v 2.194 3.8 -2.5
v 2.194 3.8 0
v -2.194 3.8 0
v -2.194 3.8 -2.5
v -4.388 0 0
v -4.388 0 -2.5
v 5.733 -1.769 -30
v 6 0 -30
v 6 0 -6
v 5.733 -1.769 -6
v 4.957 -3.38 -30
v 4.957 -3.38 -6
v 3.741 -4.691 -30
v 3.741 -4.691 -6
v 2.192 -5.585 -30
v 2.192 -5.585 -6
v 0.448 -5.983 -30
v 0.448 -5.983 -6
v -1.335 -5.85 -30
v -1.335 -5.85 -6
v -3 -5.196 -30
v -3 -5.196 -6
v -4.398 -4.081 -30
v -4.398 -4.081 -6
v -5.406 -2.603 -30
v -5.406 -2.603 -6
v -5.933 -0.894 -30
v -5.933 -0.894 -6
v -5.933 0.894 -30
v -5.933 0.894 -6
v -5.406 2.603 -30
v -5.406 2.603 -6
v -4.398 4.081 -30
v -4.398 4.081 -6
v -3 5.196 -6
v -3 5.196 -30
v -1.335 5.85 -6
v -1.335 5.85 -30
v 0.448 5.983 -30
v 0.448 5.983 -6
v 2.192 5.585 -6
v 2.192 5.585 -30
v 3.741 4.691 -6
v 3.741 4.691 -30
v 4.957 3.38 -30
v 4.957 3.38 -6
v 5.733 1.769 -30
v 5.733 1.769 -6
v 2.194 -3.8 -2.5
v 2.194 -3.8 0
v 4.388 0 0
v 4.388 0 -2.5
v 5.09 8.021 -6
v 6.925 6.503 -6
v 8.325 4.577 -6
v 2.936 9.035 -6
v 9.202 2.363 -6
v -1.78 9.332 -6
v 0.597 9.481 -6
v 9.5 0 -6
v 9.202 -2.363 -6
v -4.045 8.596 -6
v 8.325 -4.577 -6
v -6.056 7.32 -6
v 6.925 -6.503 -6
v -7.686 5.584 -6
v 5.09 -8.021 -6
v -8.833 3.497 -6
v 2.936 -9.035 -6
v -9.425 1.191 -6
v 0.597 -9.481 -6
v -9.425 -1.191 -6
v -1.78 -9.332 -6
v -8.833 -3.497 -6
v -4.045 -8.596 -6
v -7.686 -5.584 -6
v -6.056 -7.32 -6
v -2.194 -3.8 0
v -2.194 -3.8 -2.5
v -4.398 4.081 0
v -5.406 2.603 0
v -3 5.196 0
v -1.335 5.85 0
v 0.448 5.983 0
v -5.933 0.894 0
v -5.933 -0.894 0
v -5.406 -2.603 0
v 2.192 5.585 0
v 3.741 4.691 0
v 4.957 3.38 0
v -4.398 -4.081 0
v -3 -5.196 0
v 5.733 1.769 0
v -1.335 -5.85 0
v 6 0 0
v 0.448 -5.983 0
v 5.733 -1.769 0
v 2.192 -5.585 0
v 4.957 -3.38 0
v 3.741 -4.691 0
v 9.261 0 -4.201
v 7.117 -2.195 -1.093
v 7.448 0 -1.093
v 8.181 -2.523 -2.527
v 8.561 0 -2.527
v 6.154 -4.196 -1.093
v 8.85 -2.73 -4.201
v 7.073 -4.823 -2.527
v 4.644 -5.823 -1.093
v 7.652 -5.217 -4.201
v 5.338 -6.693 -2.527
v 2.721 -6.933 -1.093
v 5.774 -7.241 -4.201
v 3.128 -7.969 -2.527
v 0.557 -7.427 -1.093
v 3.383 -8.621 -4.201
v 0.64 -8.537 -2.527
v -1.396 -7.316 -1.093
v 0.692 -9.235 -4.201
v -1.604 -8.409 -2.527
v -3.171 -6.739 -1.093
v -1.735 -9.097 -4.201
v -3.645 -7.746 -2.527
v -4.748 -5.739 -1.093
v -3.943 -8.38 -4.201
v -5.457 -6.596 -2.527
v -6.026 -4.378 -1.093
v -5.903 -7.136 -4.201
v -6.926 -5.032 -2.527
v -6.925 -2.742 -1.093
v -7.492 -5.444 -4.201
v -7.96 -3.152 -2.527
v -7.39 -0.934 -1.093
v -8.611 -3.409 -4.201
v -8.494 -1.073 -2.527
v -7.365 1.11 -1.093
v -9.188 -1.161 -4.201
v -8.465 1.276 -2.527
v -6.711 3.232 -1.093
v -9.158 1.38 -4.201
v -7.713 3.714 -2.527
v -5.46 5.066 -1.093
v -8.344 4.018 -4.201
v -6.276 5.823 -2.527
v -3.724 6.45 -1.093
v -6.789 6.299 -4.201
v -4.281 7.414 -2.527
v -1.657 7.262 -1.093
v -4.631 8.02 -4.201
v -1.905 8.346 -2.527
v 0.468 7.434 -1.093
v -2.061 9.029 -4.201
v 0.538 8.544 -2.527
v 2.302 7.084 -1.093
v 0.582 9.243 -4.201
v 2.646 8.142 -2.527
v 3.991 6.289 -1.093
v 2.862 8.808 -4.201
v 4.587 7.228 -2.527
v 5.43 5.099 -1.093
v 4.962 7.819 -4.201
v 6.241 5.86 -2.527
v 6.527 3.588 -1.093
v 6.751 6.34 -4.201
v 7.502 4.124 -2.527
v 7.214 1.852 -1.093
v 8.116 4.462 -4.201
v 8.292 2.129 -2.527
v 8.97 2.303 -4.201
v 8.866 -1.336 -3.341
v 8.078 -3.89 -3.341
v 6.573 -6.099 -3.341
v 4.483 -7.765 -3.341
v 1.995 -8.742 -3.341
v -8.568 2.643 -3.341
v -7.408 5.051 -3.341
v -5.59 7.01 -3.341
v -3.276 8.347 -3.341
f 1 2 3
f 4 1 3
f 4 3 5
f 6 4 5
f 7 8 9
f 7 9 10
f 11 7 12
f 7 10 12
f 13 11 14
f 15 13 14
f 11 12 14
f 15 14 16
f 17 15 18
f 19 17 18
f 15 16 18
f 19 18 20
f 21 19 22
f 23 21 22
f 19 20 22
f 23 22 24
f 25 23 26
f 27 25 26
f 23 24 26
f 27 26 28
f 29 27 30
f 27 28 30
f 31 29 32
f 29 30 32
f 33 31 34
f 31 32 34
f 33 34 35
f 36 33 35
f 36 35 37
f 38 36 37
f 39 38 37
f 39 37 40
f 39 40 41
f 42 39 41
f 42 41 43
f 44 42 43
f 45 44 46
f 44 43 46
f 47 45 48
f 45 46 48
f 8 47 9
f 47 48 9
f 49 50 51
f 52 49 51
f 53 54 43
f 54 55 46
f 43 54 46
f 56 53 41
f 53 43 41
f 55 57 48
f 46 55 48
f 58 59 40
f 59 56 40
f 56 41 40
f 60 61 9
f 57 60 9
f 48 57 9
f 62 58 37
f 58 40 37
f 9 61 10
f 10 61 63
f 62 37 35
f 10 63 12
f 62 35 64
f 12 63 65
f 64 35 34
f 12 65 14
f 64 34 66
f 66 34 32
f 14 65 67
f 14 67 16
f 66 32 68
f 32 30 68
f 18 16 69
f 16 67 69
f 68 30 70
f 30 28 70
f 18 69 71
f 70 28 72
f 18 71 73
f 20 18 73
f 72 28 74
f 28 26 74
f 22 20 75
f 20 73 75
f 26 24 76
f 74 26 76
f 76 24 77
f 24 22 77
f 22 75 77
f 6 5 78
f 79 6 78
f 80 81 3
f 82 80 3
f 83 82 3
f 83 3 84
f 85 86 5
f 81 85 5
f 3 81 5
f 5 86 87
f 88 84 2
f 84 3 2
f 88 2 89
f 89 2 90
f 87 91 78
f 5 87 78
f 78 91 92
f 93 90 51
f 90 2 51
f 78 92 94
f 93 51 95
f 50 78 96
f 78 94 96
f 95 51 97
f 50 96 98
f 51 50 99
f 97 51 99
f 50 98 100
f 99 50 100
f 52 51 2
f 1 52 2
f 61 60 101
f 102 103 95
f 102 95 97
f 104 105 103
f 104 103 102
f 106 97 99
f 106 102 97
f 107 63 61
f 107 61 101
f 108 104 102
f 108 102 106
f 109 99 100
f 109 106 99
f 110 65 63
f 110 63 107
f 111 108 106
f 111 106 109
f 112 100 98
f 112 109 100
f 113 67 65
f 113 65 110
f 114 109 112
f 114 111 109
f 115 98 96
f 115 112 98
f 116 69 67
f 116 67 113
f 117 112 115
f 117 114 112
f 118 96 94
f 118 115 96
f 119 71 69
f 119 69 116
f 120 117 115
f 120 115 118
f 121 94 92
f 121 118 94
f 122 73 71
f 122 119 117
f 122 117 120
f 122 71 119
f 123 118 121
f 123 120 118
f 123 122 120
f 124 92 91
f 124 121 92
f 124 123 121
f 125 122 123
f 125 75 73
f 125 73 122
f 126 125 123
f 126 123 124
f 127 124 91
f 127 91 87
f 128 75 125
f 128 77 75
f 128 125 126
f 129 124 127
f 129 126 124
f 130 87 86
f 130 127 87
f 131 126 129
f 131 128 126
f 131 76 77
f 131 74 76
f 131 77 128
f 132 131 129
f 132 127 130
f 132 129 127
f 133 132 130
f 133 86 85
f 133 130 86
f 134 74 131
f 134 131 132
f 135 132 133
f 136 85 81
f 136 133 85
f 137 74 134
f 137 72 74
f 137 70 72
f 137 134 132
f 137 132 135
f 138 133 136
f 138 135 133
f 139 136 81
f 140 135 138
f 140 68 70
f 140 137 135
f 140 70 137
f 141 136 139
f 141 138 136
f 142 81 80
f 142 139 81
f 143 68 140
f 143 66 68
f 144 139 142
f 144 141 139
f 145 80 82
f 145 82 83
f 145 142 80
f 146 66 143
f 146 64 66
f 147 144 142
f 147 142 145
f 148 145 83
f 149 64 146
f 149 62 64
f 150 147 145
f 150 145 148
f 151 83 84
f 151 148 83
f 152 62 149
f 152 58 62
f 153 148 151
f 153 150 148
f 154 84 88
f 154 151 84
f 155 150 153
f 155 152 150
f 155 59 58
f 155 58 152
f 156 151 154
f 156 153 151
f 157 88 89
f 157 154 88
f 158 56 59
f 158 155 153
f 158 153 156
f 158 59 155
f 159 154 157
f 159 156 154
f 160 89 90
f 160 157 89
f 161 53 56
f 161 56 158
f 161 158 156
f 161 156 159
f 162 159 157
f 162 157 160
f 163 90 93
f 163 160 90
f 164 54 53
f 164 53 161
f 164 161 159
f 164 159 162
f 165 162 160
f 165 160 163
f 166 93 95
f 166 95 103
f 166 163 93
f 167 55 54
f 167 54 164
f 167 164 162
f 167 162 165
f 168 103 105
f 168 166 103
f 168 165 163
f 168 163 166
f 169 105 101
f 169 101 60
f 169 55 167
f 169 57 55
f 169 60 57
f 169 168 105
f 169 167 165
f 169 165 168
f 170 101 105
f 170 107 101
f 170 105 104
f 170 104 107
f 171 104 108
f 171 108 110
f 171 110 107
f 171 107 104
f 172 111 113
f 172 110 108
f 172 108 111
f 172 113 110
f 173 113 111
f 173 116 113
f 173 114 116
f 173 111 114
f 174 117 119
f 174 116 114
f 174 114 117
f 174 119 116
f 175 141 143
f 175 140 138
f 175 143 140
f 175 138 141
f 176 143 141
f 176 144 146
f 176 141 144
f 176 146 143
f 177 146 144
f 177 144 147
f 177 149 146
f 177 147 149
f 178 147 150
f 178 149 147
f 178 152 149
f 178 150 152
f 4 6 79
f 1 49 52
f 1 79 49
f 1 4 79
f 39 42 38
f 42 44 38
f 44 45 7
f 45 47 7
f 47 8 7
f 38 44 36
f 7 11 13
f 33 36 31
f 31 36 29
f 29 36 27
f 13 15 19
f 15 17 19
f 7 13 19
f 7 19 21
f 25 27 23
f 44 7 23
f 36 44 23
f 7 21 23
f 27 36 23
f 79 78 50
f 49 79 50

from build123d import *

# Parameters (mm, degrees)
CUT_EXTRUDE_1_DEPTH = 2.5


with BuildPart() as part:
    # 草图2 → 旋转1 (revolve)
    with BuildSketch(Plane(origin=(0, 0, 0), x_dir=(0, 0, -1), z_dir=(1, 0, 0)), mode=Mode.PRIVATE) as revolve_1_sk:
        Polygon((6, 9.5), (0, 9.5), (0, 0), (30, 0), (30, 6), (6, 6), align=None)
    revolve(revolve_1_sk.sketch.rotate(Axis((0, 0, 0), (0, 0, -1)), 90), axis=Axis((0, 0, 0), (0, 0, -1)))

    # 草图3 → 切除-拉伸1 (cut)
    with BuildSketch(Plane.XY):
        Polygon((2.193931023, -3.8), (4.387862046, 0), (2.193931023, 3.8), (-2.193931023, 3.8), (-4.387862046, 0), (-2.193931023, -3.8), align=None)
    extrude(amount=-CUT_EXTRUDE_1_DEPTH, mode=Mode.SUBTRACT)

    # 草图4 → 切除-旋转1 (revolve, cut)
    with BuildSketch(Plane(origin=(0, 0, 0), x_dir=(0, 0, -1), z_dir=(1, 0, 0)), mode=Mode.PRIVATE) as cut_revolve_1_sk:
        with BuildLine():
            Line((6, 9.5), (0, 9.5))
            Line((0, 9.5), (0, 6))
            ThreePointArc((0, 6), (2.526889003, 8.561047424), (6, 9.5))
        make_face()
    revolve(cut_revolve_1_sk.sketch.rotate(Axis((0, 0, 0), (0, 0, -1)), 90), axis=Axis((0, 0, 0), (0, 0, -1)), mode=Mode.SUBTRACT)


solid = part.part
